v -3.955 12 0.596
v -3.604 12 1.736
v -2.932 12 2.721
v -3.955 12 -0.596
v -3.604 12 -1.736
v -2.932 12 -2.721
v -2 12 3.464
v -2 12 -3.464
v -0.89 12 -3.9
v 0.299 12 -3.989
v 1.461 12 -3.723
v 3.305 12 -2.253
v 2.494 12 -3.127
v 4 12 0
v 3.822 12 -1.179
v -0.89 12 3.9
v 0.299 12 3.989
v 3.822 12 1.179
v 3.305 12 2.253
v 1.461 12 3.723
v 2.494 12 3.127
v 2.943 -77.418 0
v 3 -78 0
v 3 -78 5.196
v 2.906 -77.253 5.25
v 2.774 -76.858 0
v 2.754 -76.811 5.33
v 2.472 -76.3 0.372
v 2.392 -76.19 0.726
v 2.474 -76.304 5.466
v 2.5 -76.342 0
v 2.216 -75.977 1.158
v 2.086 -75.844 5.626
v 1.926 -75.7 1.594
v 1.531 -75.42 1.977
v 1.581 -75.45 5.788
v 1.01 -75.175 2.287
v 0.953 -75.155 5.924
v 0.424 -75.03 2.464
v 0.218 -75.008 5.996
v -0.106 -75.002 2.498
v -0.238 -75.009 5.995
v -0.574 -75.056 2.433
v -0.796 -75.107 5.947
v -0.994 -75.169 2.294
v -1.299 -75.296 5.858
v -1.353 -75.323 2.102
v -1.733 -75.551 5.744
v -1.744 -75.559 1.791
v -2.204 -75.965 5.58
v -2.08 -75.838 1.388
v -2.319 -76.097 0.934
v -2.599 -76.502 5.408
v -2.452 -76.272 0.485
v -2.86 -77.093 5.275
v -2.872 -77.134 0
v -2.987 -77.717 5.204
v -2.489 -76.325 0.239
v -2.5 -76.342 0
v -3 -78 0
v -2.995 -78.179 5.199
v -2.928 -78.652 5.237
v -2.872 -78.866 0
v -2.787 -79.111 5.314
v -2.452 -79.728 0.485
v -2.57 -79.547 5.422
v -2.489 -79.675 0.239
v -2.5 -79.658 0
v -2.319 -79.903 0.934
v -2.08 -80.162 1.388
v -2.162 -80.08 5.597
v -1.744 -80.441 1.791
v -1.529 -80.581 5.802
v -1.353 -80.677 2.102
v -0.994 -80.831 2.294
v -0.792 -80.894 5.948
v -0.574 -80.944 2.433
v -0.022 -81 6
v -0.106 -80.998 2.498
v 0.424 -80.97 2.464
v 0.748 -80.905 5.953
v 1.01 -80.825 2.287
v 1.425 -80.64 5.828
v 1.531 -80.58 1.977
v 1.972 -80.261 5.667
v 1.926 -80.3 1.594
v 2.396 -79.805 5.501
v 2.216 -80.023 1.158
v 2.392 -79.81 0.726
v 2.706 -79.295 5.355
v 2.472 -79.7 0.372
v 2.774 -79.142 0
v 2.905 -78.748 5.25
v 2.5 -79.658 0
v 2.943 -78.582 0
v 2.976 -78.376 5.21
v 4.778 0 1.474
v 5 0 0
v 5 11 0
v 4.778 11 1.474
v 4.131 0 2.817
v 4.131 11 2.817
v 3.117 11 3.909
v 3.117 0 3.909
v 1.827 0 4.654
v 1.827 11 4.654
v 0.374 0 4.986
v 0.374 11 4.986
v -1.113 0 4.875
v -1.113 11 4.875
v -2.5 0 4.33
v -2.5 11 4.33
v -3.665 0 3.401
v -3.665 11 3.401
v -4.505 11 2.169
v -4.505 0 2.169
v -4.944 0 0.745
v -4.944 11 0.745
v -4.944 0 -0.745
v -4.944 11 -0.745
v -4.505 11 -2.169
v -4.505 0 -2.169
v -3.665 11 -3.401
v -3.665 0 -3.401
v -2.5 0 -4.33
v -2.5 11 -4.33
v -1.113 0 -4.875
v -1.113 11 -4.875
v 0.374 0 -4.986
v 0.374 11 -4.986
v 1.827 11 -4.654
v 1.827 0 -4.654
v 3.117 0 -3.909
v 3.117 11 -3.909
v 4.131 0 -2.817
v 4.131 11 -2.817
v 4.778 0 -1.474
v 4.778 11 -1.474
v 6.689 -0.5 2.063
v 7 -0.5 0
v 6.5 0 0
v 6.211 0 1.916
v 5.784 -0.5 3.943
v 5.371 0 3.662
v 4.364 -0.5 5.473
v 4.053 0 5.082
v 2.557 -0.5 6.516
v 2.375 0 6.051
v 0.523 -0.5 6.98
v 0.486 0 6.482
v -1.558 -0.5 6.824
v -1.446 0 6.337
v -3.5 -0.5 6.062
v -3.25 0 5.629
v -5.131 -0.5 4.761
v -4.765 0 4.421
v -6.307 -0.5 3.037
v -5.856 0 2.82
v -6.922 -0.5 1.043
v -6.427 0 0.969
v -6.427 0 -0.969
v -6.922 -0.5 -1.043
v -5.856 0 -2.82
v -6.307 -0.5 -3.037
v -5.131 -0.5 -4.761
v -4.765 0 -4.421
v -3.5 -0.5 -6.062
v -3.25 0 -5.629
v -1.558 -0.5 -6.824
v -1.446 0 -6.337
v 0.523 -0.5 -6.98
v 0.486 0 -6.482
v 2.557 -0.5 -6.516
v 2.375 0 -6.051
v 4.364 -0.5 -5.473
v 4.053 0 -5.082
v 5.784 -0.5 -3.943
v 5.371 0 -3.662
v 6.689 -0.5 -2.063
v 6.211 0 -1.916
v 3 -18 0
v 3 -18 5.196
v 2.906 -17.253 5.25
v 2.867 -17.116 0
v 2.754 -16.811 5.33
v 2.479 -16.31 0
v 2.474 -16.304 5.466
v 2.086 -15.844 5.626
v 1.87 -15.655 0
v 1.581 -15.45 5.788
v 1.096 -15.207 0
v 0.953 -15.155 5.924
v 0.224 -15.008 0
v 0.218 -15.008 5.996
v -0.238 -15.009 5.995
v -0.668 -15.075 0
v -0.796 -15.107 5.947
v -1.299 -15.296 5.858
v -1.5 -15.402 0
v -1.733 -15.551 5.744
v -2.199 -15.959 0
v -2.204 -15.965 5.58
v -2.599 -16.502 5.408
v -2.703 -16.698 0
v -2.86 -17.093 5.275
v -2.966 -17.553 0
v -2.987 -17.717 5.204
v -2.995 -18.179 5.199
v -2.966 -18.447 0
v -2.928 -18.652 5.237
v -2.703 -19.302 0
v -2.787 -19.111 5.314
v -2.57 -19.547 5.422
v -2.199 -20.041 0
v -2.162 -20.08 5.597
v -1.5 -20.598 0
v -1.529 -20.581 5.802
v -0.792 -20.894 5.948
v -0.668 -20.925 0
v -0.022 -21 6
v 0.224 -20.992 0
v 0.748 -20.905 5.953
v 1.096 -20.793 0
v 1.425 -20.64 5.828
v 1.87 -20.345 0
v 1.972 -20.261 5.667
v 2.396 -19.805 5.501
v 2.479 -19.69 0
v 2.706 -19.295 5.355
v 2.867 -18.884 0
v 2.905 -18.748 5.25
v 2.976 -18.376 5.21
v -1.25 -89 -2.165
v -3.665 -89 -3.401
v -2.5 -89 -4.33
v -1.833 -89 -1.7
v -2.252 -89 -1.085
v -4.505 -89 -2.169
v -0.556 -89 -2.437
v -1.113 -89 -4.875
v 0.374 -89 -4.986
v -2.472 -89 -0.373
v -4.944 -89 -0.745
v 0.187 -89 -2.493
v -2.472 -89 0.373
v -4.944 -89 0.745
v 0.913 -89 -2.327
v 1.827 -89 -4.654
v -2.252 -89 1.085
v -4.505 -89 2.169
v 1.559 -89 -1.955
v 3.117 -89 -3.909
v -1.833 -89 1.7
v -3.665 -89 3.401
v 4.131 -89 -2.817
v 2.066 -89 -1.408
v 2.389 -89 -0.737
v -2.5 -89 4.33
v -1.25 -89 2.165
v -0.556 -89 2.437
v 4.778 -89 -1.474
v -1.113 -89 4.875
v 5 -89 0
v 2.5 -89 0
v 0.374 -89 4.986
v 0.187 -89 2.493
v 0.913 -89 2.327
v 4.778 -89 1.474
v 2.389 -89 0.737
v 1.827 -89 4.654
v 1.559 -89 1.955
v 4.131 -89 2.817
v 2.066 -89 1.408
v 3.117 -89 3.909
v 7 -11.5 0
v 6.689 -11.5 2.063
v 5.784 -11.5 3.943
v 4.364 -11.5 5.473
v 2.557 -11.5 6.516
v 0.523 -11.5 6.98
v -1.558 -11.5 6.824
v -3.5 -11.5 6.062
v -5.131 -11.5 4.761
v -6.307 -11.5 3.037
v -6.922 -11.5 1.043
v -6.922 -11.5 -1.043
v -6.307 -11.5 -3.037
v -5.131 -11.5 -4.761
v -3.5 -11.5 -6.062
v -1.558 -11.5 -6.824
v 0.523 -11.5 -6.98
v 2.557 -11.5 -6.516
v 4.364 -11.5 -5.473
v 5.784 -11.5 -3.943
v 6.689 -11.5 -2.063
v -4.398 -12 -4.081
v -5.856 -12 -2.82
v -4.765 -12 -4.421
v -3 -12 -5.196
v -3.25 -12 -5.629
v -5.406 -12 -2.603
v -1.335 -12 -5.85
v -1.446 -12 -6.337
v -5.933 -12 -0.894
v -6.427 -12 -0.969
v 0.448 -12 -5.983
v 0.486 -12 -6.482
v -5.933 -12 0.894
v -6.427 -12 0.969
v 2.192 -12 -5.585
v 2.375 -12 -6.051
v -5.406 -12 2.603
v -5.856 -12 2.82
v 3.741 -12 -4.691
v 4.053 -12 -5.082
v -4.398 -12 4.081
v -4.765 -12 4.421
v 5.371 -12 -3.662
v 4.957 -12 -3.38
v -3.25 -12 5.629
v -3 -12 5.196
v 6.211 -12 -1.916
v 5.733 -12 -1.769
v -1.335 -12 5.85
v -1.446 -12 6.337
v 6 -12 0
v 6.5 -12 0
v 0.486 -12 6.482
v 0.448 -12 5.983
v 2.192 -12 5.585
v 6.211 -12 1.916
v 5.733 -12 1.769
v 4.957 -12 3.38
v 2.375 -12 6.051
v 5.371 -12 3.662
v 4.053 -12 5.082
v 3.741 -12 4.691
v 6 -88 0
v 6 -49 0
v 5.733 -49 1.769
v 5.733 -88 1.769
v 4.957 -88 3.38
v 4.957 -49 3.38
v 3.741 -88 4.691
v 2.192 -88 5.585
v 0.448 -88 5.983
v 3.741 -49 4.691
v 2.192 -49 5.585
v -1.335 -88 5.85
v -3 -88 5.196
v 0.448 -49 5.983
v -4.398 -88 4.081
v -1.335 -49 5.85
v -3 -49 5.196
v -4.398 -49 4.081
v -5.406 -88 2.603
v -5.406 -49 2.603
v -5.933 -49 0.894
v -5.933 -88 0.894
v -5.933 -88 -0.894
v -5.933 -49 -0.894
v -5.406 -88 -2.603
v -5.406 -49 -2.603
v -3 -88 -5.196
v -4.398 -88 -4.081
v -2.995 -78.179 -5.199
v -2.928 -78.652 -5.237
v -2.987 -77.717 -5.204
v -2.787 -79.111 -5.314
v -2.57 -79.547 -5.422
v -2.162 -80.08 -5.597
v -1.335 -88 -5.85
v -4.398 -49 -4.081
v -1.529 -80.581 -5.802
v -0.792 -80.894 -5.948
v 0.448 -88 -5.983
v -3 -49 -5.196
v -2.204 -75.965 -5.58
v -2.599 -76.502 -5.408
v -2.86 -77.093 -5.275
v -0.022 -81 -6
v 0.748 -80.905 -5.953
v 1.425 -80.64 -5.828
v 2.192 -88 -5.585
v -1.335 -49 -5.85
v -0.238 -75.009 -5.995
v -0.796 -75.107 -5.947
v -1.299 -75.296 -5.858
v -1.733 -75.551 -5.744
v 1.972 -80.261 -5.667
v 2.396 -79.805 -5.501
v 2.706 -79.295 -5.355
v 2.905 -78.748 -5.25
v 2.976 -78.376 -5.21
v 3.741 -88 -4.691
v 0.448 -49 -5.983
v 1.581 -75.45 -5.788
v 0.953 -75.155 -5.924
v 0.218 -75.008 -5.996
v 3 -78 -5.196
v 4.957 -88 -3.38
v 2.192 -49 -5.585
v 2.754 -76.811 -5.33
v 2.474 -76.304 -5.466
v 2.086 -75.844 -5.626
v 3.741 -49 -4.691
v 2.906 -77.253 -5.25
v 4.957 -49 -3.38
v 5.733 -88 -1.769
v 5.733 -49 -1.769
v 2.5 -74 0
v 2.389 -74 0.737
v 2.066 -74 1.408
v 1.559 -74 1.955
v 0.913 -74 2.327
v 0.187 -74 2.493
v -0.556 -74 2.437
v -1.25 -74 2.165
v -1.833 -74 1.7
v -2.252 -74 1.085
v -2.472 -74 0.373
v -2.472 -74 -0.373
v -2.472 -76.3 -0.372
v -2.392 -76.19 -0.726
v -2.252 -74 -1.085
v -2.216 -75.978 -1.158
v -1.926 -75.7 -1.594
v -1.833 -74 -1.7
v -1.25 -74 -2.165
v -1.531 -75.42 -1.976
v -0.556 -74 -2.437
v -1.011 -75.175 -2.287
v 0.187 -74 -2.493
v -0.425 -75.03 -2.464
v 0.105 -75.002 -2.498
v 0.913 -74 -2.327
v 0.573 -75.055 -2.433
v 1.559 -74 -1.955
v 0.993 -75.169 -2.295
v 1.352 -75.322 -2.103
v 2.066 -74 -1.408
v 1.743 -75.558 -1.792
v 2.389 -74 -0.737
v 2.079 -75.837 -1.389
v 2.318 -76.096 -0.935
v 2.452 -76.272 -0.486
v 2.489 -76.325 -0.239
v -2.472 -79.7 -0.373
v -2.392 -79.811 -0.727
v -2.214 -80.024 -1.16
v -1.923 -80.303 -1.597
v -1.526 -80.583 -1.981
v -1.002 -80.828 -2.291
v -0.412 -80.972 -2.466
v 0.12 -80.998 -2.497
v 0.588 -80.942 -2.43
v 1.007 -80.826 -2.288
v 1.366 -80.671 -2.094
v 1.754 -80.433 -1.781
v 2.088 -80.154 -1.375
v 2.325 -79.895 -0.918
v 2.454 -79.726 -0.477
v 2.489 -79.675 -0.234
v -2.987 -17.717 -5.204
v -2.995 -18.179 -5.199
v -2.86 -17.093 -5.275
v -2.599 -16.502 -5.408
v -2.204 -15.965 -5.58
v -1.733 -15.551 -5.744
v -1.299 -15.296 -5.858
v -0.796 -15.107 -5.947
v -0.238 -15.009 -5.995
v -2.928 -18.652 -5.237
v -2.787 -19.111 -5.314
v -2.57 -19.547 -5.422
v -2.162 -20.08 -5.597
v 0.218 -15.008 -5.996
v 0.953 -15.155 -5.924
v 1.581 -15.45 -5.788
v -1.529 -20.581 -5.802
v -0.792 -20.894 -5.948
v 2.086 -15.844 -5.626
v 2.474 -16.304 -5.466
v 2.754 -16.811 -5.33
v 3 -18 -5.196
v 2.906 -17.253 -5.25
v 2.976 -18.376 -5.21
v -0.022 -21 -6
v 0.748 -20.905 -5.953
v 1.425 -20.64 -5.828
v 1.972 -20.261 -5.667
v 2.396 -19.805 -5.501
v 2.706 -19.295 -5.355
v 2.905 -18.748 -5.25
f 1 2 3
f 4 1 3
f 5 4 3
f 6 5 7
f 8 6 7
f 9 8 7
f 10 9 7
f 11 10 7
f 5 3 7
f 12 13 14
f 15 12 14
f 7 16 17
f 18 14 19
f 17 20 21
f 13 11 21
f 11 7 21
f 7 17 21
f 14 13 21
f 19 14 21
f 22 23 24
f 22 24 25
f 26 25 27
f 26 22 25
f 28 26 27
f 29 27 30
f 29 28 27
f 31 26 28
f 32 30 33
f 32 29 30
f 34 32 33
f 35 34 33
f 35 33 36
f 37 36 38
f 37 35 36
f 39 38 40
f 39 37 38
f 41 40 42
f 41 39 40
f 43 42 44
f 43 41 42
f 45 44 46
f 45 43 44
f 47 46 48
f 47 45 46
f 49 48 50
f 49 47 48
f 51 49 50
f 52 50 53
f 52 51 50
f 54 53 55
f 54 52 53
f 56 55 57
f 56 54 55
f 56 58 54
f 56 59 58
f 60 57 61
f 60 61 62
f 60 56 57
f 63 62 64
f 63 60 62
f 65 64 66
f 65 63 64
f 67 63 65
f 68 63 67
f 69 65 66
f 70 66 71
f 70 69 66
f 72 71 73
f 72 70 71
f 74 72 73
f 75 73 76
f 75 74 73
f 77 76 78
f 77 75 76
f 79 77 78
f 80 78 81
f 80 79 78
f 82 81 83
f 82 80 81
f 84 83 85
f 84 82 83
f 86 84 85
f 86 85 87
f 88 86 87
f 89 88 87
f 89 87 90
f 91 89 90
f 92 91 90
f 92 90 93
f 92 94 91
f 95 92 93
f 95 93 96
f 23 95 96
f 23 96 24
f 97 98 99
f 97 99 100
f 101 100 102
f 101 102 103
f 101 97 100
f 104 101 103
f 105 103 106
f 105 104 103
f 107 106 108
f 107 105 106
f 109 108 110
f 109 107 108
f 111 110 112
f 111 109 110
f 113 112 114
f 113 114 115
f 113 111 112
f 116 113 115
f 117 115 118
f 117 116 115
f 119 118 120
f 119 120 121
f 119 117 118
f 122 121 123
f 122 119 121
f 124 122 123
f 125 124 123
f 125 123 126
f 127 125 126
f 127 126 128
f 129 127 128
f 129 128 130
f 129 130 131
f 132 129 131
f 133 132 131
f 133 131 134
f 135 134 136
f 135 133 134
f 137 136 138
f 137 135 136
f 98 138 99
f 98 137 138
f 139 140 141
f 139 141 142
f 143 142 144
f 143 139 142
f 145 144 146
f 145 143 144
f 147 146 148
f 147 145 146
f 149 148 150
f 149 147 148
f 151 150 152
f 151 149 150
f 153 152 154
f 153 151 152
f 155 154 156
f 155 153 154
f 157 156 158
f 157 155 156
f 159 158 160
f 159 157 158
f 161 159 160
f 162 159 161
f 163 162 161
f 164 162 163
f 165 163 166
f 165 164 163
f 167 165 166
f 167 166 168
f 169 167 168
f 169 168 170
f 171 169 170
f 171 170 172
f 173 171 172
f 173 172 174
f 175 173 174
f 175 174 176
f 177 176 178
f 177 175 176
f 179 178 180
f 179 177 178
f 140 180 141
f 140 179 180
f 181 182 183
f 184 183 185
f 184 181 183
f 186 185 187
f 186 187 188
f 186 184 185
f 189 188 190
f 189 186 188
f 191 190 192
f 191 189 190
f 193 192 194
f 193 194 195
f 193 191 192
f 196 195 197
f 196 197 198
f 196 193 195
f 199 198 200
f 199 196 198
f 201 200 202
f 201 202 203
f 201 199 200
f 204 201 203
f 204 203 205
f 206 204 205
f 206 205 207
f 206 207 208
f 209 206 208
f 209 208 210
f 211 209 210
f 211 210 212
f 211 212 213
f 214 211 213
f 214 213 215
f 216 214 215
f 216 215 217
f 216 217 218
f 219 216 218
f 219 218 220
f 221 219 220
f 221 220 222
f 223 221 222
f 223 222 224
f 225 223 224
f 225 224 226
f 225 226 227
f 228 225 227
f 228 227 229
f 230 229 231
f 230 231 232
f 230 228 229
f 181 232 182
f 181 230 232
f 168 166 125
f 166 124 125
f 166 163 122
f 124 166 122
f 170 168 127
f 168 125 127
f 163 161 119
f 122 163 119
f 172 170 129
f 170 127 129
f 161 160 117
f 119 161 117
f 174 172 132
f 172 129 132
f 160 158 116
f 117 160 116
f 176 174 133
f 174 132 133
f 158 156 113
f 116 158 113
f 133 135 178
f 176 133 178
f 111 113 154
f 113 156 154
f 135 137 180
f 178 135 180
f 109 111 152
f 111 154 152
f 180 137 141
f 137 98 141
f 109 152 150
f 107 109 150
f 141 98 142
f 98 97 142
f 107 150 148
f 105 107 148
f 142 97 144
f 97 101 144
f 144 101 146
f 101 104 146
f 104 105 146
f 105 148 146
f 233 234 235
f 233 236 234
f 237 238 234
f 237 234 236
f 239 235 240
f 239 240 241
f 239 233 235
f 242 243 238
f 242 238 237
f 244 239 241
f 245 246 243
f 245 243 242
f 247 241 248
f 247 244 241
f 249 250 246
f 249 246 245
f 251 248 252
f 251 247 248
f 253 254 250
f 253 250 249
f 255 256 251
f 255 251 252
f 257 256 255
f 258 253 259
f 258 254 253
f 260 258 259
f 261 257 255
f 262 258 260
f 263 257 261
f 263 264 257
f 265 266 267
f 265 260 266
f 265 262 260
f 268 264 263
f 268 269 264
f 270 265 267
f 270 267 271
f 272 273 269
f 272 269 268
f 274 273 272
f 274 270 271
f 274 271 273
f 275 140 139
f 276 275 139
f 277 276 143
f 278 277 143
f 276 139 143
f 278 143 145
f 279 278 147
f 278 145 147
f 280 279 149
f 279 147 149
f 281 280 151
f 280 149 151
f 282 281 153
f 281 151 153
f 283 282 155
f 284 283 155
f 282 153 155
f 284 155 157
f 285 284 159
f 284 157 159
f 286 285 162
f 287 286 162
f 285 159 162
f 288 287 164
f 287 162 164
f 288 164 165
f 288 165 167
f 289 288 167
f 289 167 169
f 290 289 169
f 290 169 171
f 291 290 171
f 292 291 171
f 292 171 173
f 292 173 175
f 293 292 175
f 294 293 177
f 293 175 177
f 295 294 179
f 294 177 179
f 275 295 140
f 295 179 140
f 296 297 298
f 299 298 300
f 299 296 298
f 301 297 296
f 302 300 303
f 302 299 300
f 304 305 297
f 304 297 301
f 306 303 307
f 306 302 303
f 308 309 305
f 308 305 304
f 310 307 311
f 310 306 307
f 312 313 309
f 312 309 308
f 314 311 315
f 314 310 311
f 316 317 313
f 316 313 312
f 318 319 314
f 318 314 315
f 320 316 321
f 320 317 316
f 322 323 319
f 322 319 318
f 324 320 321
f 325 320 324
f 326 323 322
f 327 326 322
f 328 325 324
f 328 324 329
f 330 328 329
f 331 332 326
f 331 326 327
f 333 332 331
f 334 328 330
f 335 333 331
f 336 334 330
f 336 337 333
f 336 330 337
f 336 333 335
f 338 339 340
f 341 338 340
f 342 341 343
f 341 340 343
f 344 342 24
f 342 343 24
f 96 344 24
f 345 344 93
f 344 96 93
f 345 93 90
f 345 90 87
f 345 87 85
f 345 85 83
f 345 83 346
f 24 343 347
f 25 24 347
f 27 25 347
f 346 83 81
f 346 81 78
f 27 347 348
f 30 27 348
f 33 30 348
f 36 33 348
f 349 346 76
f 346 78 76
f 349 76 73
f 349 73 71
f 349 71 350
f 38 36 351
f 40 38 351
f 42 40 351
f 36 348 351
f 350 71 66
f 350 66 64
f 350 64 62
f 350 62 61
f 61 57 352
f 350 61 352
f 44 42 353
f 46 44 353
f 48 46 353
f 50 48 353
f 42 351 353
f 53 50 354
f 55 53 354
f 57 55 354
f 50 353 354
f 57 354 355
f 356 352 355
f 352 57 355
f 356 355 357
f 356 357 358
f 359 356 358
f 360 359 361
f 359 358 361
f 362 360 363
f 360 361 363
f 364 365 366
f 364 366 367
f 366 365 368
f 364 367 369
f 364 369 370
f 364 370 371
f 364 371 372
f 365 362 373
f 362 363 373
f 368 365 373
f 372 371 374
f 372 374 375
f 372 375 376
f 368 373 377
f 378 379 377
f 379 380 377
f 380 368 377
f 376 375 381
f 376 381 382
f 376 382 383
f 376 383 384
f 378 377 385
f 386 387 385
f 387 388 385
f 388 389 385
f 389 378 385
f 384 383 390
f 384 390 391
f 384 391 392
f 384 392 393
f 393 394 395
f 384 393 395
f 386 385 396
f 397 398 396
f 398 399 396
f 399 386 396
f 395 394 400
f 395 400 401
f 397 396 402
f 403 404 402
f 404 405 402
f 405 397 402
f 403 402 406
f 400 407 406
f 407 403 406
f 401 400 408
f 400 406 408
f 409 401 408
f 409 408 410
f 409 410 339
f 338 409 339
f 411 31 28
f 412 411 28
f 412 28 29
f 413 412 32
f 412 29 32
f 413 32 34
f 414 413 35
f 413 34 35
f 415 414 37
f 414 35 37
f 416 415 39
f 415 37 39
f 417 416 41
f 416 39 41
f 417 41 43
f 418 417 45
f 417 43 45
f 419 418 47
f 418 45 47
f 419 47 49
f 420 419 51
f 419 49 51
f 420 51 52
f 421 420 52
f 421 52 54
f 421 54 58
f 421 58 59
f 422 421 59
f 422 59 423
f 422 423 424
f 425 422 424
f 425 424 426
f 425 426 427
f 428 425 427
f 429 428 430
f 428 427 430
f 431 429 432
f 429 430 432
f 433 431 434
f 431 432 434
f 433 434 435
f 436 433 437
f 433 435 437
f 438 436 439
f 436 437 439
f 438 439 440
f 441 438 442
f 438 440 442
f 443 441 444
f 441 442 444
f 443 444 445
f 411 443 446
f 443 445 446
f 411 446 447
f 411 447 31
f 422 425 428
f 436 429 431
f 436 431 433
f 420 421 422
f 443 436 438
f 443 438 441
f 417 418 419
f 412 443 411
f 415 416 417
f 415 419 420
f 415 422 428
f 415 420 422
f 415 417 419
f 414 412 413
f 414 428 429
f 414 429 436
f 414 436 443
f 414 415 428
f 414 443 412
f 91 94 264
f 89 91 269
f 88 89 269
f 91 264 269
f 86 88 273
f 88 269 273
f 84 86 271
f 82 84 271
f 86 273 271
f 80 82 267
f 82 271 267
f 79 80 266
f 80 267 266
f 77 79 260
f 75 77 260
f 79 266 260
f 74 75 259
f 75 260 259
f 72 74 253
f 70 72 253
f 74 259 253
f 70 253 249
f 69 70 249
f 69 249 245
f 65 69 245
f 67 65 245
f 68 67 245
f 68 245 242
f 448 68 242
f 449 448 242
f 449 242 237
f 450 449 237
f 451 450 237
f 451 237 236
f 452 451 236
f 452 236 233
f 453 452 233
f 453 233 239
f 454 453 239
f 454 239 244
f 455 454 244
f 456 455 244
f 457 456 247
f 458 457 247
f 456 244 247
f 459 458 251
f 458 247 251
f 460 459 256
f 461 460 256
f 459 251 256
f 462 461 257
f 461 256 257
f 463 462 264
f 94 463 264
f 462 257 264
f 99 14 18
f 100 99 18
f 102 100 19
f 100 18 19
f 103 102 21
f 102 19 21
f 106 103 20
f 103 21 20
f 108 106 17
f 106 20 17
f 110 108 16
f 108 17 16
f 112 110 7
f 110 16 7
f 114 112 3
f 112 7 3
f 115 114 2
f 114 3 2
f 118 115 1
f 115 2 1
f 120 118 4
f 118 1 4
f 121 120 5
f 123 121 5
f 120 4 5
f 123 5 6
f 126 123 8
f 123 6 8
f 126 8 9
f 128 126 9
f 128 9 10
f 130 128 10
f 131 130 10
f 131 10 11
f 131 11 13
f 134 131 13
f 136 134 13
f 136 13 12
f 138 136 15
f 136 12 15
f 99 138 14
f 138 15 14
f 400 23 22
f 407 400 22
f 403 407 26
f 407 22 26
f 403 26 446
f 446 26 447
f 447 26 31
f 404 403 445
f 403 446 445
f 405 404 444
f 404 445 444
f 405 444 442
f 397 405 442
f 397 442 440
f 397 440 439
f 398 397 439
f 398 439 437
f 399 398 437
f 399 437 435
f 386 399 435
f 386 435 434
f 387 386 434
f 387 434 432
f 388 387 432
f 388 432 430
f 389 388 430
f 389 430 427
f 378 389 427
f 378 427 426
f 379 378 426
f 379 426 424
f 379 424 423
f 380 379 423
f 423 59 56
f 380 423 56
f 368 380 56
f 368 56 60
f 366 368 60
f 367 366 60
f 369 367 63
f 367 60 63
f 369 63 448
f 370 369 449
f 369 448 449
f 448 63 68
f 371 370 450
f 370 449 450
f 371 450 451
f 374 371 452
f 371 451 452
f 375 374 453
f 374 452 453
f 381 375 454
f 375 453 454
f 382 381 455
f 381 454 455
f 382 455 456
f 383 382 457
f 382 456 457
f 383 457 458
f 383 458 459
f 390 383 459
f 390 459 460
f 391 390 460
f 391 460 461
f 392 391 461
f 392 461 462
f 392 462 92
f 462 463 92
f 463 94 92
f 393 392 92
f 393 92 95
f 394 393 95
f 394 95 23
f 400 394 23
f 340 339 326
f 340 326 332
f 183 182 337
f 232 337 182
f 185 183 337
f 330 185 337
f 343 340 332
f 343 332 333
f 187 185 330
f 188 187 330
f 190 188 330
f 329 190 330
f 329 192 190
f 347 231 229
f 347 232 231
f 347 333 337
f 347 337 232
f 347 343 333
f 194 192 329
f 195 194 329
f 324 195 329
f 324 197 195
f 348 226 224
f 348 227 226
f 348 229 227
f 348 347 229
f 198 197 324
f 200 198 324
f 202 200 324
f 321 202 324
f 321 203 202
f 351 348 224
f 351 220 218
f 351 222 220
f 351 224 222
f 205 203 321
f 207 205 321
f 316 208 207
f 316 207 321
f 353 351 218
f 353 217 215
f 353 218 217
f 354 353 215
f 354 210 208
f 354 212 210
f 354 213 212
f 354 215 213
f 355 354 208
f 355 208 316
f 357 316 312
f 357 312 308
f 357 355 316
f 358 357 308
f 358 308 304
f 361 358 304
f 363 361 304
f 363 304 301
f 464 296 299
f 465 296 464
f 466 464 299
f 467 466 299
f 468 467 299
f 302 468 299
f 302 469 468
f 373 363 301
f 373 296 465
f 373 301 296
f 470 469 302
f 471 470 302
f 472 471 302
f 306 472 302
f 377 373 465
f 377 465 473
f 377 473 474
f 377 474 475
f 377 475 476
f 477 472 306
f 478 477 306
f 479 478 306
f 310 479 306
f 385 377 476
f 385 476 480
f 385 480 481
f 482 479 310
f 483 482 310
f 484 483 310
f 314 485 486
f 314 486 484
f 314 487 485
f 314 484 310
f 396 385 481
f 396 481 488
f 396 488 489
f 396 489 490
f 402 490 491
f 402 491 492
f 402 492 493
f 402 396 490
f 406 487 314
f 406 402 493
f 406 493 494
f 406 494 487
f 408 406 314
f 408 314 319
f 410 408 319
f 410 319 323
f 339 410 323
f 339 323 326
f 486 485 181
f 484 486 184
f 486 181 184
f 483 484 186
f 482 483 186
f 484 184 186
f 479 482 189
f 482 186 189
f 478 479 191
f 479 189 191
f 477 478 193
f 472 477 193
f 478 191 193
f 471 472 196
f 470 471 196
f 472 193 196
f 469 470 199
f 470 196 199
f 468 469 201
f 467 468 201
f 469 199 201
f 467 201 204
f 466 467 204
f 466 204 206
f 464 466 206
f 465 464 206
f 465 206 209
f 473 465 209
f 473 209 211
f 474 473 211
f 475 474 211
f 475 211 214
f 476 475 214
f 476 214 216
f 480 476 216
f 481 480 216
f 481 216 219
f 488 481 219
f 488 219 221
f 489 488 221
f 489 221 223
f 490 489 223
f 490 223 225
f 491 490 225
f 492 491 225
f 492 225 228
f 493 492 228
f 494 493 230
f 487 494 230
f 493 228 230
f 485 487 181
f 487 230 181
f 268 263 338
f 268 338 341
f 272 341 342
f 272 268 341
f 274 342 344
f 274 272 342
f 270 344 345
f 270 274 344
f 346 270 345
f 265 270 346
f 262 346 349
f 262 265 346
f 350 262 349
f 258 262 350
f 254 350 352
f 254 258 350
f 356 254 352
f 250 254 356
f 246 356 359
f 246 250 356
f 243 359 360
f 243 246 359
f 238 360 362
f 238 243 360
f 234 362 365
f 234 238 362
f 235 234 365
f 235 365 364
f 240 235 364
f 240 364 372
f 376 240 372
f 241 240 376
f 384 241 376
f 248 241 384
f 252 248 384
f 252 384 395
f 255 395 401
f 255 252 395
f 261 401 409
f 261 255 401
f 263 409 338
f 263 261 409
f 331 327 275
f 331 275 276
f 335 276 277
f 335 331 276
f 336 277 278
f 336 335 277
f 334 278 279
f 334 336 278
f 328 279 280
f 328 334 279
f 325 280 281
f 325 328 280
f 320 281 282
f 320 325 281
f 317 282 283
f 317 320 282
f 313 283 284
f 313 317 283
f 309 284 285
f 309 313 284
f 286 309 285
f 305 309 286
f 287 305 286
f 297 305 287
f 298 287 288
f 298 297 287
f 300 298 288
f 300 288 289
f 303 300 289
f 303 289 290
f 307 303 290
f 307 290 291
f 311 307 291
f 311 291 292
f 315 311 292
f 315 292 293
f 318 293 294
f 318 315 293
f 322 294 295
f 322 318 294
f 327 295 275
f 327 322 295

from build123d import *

# Parameters (mm, degrees)
F0_R           = 7
F0_R_2         = 6
F1_DEPTH       = 12
F0_R_3         = 5
F2_DEPTH       = 24
F3_DEPTH       = 24
F3_DEPTH_BACK  = 12
F4_SIZE        = 1
F5_SIZE        = 0.5
F6_R           = 3
F7_DEPTH       = 25
F7_DEPTH_BACK  = 25
F9_R           = 6
F10_DEPTH      = 26
F10_DEPTH_BACK = 40
F11_SIZE       = 1
F12_DEPTH      = 25
F12_DEPTH_BACK = 25
F13_R          = 2.5
F14_DEPTH      = 15


with BuildPart() as f1:
    # F0 (on Front) → F1 (new body)
    with BuildSketch(Plane.XZ):
        Circle(F0_R)
        Circle(F0_R_2, mode=Mode.SUBTRACT)
    extrude(amount=F1_DEPTH)

    # F0 (on Front) → F2 (join)
    with BuildSketch(Plane.XZ):
        Circle(F0_R_2)
        Circle(F0_R_3, mode=Mode.SUBTRACT)
    extrude(amount=F2_DEPTH)

    # F0 (on Front) → F3 (join, two sides)
    with BuildSketch(Plane.XZ) as f3_sk:
        Circle(F0_R_3)
    extrude(amount=F3_DEPTH)
    extrude(f3_sk.sketch, amount=-F3_DEPTH_BACK)

    # F4
    f4_edges = [f1.edges().sort_by_distance(p)[0] for p in [
        (-5, 12, 0),
    ]]
    chamfer(f4_edges, length=F4_SIZE)

    # F5
    f5_edges = [f1.edges().sort_by_distance(p)[0] for p in [
        (-6, -24, 0),
        (-7, -12, 0),
        (7, -6, 0),
        (-7, 0, 0),
    ]]
    chamfer(f5_edges, length=F5_SIZE)

    # F6 (on Top) → F7 (cut, two sides)
    with BuildSketch(Plane.XY) as f7_sk:
        with Locations((0, -18)):
            Circle(F6_R)
        with Locations((0, -78)):
            Circle(F6_R)
    extrude(amount=-F7_DEPTH, mode=Mode.SUBTRACT)
    extrude(f7_sk.sketch, amount=F7_DEPTH_BACK, mode=Mode.SUBTRACT)

    # F9 (on offset) → F10 (join, two sides)
    with BuildSketch(Plane.XZ.offset(49)) as f10_sk:
        Circle(F9_R)
    extrude(amount=-F10_DEPTH)
    extrude(f10_sk.sketch, amount=F10_DEPTH_BACK)

    # F11
    f11_edges = [f1.edges().sort_by_distance(p)[0] for p in [
        (-6, -89, 0),
    ]]
    chamfer(f11_edges, length=F11_SIZE)

    # F6 (on Top) → F12 (cut, two sides)
    with BuildSketch(Plane.XY) as f12_sk:
        with Locations((0, -18)):
            Circle(F6_R)
        with Locations((0, -78)):
            Circle(F6_R)
    extrude(amount=F12_DEPTH, mode=Mode.SUBTRACT)
    extrude(f12_sk.sketch, amount=-F12_DEPTH_BACK, mode=Mode.SUBTRACT)

    # F13 (on face) → F14 (cut)
    with BuildSketch(Plane.XZ.offset(89)):
        Circle(F13_R)
    extrude(amount=-F14_DEPTH, mode=Mode.SUBTRACT)


solid = f1.part
